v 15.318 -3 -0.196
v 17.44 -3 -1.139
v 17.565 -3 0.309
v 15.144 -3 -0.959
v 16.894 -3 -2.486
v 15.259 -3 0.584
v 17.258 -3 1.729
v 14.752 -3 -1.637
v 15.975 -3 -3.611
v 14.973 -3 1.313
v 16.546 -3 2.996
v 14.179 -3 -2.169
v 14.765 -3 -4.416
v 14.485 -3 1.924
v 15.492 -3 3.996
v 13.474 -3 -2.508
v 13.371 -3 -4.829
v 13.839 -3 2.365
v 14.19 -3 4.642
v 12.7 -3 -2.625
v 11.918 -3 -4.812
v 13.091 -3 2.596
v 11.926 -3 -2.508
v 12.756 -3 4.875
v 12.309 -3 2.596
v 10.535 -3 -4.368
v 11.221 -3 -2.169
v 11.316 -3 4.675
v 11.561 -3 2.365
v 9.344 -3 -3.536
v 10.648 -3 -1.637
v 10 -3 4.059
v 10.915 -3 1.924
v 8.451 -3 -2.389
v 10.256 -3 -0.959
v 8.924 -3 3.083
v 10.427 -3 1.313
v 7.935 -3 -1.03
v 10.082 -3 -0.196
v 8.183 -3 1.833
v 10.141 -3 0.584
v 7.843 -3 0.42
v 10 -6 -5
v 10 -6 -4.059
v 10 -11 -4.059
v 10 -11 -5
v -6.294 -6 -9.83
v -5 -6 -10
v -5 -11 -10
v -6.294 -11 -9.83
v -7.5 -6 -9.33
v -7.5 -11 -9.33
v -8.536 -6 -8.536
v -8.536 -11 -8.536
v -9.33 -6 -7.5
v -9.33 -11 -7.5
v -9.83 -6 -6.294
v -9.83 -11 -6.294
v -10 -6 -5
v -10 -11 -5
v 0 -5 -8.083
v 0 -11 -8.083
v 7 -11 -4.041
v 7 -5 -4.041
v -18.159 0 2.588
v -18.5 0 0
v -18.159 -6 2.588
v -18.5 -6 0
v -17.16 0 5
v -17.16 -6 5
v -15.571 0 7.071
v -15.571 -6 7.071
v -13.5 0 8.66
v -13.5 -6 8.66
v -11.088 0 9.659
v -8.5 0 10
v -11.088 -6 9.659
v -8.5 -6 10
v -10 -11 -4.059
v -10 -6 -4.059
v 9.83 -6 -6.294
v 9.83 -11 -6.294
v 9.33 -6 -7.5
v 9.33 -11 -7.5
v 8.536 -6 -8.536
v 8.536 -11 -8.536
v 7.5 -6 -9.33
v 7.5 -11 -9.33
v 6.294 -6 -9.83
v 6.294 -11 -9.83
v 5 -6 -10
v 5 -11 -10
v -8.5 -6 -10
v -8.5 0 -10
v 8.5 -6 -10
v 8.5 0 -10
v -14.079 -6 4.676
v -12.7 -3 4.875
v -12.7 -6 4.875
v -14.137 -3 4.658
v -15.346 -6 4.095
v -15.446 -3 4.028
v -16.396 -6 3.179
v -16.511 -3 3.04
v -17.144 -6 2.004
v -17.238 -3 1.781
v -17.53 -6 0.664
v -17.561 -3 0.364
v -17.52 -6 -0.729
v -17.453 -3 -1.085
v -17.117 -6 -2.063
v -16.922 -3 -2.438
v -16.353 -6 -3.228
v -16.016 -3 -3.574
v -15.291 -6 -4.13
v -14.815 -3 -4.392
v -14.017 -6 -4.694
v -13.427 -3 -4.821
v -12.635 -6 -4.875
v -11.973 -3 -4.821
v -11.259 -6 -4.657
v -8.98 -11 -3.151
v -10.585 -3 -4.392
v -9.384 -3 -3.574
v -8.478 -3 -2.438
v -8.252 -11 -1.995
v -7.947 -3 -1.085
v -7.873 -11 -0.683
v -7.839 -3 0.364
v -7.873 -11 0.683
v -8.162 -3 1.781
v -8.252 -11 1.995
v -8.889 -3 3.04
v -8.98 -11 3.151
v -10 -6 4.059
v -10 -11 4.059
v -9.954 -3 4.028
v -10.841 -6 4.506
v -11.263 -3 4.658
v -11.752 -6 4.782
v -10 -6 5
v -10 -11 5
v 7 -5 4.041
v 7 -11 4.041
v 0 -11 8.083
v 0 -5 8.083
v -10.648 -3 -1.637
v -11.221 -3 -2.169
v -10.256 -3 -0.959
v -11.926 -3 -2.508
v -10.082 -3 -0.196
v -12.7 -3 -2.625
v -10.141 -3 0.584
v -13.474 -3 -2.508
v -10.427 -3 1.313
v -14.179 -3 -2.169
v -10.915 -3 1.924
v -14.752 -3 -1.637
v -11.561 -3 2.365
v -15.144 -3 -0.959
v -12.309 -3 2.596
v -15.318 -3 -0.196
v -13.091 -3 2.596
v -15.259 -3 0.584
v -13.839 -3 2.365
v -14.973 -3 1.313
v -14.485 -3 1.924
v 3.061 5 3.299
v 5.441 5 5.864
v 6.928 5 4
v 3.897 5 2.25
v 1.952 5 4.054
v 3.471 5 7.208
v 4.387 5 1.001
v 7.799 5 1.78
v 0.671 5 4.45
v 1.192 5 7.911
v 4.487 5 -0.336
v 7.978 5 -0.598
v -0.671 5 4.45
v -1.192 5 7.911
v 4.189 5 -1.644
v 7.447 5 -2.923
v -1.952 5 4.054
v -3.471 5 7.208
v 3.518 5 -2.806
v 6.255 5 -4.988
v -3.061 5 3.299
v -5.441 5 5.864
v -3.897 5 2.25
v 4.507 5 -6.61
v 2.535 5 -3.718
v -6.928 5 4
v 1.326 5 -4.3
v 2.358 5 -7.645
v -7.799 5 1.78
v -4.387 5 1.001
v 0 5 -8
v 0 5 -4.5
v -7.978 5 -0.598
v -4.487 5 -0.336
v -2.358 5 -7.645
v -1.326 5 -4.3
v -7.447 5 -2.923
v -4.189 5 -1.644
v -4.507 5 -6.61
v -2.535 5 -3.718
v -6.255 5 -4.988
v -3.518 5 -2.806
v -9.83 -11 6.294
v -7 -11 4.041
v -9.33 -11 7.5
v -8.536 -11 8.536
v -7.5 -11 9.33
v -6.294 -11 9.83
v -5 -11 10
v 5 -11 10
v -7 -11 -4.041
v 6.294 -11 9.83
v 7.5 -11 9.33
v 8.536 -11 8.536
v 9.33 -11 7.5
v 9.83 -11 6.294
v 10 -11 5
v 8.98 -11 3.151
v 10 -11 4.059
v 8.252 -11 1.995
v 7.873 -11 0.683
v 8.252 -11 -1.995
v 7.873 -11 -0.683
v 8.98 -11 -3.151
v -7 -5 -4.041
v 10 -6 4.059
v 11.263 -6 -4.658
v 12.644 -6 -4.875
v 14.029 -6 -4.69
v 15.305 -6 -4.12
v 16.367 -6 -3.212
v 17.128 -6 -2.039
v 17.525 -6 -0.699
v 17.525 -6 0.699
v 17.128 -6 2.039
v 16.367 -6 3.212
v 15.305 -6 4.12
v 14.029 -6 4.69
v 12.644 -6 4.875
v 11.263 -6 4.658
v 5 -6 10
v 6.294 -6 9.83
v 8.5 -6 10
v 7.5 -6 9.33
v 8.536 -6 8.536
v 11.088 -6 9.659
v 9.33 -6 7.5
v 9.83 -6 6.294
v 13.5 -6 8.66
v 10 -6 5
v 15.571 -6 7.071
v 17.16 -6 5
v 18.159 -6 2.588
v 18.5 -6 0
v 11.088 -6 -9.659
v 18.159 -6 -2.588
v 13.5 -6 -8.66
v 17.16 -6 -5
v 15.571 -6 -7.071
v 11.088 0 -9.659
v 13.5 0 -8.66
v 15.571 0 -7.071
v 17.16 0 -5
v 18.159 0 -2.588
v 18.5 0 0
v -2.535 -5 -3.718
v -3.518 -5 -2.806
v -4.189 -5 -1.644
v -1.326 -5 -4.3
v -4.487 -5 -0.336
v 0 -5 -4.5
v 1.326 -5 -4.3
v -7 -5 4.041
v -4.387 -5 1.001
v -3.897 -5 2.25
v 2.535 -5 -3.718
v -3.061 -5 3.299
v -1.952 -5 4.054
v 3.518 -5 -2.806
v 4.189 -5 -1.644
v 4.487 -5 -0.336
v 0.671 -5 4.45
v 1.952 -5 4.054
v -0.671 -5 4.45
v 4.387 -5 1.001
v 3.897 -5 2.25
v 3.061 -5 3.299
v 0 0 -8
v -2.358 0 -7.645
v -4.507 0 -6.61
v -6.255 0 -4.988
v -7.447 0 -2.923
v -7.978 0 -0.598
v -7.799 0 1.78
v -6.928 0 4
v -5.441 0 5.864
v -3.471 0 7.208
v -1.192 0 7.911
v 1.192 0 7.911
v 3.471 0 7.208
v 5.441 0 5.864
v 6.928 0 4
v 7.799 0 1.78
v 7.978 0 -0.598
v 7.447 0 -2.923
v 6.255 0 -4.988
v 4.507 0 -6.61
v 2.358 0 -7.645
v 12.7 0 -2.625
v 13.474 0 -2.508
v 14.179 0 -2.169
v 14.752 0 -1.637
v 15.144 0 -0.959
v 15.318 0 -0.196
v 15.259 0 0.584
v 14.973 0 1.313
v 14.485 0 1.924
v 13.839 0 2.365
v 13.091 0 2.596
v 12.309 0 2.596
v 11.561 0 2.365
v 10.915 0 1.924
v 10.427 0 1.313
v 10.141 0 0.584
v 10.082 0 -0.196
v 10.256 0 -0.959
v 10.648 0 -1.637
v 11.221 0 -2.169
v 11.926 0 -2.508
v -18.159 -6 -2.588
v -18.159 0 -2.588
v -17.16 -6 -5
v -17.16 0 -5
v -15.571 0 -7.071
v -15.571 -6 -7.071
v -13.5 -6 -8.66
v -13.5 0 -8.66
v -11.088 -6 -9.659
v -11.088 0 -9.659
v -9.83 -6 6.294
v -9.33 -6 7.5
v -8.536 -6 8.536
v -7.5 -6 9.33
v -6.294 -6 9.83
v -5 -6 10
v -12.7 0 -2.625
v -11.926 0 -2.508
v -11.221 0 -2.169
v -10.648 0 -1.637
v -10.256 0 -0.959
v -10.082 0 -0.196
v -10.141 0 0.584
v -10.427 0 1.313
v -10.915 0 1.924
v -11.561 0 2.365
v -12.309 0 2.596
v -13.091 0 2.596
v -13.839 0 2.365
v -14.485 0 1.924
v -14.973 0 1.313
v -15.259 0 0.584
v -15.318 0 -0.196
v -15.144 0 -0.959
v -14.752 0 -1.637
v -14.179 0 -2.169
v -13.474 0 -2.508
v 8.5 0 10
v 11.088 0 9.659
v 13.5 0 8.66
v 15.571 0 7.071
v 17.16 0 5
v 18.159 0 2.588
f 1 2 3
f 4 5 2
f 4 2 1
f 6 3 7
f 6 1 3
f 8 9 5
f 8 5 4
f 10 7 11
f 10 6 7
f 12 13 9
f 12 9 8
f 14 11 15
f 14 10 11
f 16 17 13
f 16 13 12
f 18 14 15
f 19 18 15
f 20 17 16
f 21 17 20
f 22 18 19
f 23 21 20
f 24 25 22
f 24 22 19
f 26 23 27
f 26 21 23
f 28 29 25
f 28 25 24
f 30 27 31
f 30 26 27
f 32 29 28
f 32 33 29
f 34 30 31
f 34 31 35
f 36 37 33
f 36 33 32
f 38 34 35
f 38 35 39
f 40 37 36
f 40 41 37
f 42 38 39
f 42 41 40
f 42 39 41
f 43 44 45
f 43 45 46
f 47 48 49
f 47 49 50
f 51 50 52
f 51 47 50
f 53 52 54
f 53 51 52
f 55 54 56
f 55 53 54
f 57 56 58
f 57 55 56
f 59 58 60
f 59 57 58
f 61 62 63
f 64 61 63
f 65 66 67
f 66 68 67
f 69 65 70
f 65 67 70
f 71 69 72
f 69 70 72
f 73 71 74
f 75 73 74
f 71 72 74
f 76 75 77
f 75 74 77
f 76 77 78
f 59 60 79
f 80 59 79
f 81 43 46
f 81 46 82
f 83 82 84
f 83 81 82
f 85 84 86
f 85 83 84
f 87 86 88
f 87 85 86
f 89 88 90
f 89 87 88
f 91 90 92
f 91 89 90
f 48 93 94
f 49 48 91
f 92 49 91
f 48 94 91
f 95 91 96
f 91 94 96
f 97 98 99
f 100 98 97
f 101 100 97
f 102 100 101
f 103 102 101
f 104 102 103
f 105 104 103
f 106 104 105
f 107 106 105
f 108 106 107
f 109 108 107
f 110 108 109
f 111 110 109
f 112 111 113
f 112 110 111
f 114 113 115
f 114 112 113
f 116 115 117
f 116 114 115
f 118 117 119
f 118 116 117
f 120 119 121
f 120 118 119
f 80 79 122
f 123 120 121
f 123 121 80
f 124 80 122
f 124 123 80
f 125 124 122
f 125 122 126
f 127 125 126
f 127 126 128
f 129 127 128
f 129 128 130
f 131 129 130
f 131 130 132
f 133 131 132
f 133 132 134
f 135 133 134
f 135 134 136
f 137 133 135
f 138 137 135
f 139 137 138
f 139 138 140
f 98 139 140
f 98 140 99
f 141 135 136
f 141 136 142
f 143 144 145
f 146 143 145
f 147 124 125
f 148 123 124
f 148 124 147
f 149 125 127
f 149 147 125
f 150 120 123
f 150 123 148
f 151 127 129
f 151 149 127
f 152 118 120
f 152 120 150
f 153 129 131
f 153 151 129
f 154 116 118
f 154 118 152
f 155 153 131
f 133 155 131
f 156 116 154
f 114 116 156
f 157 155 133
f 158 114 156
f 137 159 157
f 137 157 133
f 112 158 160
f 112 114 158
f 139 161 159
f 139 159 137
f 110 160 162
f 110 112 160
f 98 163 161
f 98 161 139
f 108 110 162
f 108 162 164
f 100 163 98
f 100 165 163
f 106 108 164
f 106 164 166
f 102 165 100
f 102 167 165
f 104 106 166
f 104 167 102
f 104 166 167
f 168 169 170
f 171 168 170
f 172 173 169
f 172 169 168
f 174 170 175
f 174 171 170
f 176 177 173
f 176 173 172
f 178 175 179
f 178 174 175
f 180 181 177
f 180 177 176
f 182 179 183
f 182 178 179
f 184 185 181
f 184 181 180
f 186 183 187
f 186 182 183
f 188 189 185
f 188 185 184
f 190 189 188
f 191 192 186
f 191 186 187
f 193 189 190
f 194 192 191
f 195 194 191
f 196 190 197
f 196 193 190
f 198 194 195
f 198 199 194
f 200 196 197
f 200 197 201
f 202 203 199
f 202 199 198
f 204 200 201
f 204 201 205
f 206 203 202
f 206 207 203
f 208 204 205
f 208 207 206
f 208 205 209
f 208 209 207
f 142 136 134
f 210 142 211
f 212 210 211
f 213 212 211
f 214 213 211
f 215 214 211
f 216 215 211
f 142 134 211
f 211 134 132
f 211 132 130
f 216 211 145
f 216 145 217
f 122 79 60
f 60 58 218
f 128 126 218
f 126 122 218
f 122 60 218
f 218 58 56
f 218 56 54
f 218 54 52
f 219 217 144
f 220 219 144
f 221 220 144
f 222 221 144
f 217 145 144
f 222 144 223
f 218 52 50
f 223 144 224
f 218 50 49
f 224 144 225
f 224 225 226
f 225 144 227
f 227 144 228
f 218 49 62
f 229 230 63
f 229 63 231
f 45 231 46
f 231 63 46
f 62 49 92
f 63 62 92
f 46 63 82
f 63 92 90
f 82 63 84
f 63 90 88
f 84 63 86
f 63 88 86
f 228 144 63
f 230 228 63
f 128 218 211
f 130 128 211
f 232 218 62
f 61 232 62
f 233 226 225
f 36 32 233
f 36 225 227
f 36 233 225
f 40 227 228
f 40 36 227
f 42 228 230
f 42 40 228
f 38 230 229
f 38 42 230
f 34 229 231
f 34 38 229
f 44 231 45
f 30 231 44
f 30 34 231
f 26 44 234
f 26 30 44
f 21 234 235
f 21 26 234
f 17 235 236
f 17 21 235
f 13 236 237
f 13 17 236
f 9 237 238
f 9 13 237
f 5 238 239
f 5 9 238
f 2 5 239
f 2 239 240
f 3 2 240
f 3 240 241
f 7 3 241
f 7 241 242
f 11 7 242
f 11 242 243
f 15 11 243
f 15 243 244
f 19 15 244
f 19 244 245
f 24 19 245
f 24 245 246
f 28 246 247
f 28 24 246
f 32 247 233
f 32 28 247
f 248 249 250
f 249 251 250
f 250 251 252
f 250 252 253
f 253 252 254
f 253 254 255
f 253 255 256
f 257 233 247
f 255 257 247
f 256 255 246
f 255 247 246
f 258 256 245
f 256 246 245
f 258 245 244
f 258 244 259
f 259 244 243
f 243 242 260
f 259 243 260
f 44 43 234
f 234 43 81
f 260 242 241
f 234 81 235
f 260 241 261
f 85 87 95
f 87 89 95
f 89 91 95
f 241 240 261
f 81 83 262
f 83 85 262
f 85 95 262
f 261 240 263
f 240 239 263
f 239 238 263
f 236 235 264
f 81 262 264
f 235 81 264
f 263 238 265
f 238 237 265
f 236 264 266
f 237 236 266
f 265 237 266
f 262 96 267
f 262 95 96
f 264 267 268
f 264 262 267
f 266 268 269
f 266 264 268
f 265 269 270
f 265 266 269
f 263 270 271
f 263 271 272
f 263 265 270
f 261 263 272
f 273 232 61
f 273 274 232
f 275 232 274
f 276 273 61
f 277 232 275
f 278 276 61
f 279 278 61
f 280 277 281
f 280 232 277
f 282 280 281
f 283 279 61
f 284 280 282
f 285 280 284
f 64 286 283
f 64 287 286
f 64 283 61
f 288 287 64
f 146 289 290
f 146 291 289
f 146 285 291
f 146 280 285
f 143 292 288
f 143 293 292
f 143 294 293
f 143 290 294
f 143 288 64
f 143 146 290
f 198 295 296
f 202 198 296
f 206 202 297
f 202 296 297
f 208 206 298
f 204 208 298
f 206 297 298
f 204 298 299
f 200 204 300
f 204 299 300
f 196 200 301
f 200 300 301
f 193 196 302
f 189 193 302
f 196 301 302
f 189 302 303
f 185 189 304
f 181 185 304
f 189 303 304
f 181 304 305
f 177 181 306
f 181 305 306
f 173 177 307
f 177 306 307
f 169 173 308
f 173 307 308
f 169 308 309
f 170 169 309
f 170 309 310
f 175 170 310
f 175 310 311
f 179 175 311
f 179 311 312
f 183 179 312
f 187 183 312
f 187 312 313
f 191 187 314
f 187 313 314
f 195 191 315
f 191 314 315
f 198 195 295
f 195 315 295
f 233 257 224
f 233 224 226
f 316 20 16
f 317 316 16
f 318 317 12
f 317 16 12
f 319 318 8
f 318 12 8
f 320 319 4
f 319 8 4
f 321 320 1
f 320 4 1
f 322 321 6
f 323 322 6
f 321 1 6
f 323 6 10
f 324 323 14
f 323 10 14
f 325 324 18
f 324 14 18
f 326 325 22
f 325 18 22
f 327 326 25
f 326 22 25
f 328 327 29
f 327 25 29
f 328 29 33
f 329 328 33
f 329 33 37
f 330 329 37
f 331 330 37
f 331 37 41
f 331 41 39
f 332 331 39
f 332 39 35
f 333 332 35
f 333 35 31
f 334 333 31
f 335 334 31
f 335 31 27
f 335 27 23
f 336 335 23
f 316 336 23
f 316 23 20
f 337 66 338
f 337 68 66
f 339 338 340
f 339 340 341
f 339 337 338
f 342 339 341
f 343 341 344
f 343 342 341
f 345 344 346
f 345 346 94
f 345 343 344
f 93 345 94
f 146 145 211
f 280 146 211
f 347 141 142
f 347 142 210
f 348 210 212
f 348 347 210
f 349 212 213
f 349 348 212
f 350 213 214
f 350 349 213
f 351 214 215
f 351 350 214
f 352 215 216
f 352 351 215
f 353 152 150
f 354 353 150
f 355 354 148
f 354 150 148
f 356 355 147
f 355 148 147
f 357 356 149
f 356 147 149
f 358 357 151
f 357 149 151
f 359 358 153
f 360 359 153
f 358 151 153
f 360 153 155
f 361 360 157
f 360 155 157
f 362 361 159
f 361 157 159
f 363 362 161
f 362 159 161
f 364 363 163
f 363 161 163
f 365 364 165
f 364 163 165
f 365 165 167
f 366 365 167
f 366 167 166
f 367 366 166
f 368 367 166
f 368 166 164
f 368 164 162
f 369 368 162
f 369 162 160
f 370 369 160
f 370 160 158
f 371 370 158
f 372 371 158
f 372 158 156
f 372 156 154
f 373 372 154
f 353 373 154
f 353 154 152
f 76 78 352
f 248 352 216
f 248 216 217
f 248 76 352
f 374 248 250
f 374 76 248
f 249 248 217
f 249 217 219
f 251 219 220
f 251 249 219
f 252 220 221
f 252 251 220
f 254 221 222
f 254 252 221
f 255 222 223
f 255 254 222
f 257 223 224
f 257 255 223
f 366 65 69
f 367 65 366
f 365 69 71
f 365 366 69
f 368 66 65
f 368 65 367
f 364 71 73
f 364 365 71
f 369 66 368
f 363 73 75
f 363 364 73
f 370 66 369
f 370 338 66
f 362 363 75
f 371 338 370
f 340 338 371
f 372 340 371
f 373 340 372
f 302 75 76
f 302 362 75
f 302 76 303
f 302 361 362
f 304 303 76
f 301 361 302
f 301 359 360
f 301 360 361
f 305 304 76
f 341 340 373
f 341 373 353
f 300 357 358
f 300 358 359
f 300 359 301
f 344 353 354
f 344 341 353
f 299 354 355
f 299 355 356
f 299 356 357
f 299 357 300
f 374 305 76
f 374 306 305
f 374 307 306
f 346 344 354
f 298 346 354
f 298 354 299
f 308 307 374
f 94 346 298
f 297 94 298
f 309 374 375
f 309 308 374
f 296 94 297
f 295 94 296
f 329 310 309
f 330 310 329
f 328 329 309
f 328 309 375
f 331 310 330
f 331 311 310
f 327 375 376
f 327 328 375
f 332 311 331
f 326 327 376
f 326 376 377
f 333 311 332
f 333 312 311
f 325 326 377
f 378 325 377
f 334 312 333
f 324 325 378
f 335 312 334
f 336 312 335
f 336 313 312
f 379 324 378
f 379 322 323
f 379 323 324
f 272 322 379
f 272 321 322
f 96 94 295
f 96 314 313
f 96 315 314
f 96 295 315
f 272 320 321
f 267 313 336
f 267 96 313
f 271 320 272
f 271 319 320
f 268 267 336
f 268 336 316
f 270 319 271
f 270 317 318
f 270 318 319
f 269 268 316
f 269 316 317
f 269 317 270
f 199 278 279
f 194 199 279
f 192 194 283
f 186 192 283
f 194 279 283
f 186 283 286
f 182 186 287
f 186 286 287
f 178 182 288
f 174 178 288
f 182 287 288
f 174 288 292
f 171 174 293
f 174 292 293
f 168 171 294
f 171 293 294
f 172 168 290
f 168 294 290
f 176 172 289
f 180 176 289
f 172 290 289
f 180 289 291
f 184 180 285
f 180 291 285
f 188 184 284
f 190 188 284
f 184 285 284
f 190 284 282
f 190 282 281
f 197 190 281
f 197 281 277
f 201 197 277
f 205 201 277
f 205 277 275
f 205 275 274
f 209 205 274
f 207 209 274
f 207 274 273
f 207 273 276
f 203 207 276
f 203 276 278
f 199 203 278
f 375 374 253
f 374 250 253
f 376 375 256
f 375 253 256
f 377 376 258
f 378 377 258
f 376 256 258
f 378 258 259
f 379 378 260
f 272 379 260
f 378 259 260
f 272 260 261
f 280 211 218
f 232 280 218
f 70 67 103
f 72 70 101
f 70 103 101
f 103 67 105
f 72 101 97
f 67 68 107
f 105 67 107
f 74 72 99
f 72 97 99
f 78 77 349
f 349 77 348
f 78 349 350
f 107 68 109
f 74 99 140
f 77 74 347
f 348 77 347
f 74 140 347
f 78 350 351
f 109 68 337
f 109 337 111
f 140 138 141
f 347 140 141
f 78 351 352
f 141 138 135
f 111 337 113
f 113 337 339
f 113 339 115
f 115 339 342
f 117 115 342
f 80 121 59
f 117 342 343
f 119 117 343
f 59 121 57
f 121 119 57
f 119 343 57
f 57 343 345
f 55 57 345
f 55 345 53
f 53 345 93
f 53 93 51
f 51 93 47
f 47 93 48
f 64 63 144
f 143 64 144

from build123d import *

# Parameters (mm, degrees)
BOSS_EXTRUDE1_DEPTH     = 11
SKETCH2_W               = 37
SKETCH2_H               = 20
BOSS_EXTRUDE2_DEPTH     = 6
SKETCH8_R               = 8
BOSS_EXTRUDE3_DEPTH     = 5
CUT_EXTRUDE1_DEPTH      = 24.732888573
CUT_EXTRUDE1_DEPTH_BACK = 3
SKETCH4_R               = 4.875
SKETCH5_R               = 2.625
CUT_EXTRUDE2_DEPTH      = 24.732888573
CUT_EXTRUDE3_DEPTH      = 6
SKETCH7_R               = 4.5
CUT_EXTRUDE4_DEPTH      = 24.286262044
FILLET2_R               = 10


with BuildPart() as part:
    # Sketch1 → Boss-Extrude1 (new body)
    with BuildSketch(Plane(origin=(0, 0, 0), x_dir=(1, 0, 0), z_dir=(0, 1, 0))):
        with BuildLine():
            Line((-5, -10), (5, -10))
            ThreePointArc((5, -10), (8.535533906, -8.535533906), (10, -5))
            Line((10, -5), (10, 5))
            ThreePointArc((10, 5), (8.535533906, 8.535533906), (5, 10))
            Line((5, 10), (-5, 10))
            ThreePointArc((-5, 10), (-8.535533906, 8.535533906), (-10, 5))
            Line((-10, 5), (-10, -5))
            ThreePointArc((-10, -5), (-8.535533906, -8.535533906), (-5, -10))
        make_face()
    extrude(amount=-BOSS_EXTRUDE1_DEPTH)

    # Sketch2 → Boss-Extrude2 (add)
    with BuildSketch(Plane(origin=(0, 0, 0), x_dir=(1, 0, 0), z_dir=(0, 1, 0))):
        Rectangle(SKETCH2_W, SKETCH2_H)
    extrude(amount=-BOSS_EXTRUDE2_DEPTH)

    # Sketch8 → Boss-Extrude3 (add)
    with BuildSketch(Plane(origin=(0, 0, 0), x_dir=(1, 0, 0), z_dir=(0, 1, 0))):
        with Locations(Location((0, 0, 0), (0, 0, 90))):
            Circle(SKETCH8_R)
    extrude(amount=BOSS_EXTRUDE3_DEPTH)

    # Sketch4 → Cut-Extrude1 (cut, two sides: drawn at the far end of the back side and taken through both)
    with BuildSketch(Plane(origin=(0, -6, 0), x_dir=(-1, 0, 0), z_dir=(0, -1, 0)).offset(-CUT_EXTRUDE1_DEPTH_BACK)):
        with Locations(Location((-12.7, 0, 0), (0, 0, 303.631277448))):
            Circle(SKETCH4_R)
        with Locations(Location((12.7, 0, 0), (0, 0, 270))):
            Circle(SKETCH4_R)
    extrude(amount=CUT_EXTRUDE1_DEPTH + CUT_EXTRUDE1_DEPTH_BACK, mode=Mode.SUBTRACT)

    # Sketch5 → Cut-Extrude2 (cut, through all)
    with BuildSketch(Plane(origin=(0, -6, 0), x_dir=(-1, 0, 0), z_dir=(0, -1, 0))):
        with Locations(Location((-12.7, 0, 0), (0, 0, 90))):
            Circle(SKETCH5_R)
        with Locations(Location((12.7, 0, 0), (0, 0, 90))):
            Circle(SKETCH5_R)
    extrude(amount=-CUT_EXTRUDE2_DEPTH, mode=Mode.SUBTRACT)

    # Sketch6 → Cut-Extrude3 (cut)
    with BuildSketch(Plane.XZ.offset(11)):
        Polygon((7, -4.041451884), (7, 4.041451884), (0, 8.082903769), (-7, 4.041451884), (-7, -4.041451884), (0, -8.082903769), align=None)
    extrude(amount=-CUT_EXTRUDE3_DEPTH, mode=Mode.SUBTRACT)

    # Sketch7 → Cut-Extrude4 (cut, through all)
    with BuildSketch(Plane.XZ.offset(5)):
        with Locations(Location((0, 0, 0), (0, 0, 270))):
            Circle(SKETCH7_R)
    extrude(amount=-CUT_EXTRUDE4_DEPTH, mode=Mode.SUBTRACT)

    # Fillet2
    fillet2_edges = [part.edges().sort_by_distance(p)[0] for p in [
        (-18.5, -3, 10),
        (-18.5, -3, -10),
        (18.5, -3, -10),
        (18.5, -3, 10),
    ]]
    fillet(fillet2_edges, radius=FILLET2_R - 0.0001)  # a hair under: the kernel refuses the full size


solid = part.part
